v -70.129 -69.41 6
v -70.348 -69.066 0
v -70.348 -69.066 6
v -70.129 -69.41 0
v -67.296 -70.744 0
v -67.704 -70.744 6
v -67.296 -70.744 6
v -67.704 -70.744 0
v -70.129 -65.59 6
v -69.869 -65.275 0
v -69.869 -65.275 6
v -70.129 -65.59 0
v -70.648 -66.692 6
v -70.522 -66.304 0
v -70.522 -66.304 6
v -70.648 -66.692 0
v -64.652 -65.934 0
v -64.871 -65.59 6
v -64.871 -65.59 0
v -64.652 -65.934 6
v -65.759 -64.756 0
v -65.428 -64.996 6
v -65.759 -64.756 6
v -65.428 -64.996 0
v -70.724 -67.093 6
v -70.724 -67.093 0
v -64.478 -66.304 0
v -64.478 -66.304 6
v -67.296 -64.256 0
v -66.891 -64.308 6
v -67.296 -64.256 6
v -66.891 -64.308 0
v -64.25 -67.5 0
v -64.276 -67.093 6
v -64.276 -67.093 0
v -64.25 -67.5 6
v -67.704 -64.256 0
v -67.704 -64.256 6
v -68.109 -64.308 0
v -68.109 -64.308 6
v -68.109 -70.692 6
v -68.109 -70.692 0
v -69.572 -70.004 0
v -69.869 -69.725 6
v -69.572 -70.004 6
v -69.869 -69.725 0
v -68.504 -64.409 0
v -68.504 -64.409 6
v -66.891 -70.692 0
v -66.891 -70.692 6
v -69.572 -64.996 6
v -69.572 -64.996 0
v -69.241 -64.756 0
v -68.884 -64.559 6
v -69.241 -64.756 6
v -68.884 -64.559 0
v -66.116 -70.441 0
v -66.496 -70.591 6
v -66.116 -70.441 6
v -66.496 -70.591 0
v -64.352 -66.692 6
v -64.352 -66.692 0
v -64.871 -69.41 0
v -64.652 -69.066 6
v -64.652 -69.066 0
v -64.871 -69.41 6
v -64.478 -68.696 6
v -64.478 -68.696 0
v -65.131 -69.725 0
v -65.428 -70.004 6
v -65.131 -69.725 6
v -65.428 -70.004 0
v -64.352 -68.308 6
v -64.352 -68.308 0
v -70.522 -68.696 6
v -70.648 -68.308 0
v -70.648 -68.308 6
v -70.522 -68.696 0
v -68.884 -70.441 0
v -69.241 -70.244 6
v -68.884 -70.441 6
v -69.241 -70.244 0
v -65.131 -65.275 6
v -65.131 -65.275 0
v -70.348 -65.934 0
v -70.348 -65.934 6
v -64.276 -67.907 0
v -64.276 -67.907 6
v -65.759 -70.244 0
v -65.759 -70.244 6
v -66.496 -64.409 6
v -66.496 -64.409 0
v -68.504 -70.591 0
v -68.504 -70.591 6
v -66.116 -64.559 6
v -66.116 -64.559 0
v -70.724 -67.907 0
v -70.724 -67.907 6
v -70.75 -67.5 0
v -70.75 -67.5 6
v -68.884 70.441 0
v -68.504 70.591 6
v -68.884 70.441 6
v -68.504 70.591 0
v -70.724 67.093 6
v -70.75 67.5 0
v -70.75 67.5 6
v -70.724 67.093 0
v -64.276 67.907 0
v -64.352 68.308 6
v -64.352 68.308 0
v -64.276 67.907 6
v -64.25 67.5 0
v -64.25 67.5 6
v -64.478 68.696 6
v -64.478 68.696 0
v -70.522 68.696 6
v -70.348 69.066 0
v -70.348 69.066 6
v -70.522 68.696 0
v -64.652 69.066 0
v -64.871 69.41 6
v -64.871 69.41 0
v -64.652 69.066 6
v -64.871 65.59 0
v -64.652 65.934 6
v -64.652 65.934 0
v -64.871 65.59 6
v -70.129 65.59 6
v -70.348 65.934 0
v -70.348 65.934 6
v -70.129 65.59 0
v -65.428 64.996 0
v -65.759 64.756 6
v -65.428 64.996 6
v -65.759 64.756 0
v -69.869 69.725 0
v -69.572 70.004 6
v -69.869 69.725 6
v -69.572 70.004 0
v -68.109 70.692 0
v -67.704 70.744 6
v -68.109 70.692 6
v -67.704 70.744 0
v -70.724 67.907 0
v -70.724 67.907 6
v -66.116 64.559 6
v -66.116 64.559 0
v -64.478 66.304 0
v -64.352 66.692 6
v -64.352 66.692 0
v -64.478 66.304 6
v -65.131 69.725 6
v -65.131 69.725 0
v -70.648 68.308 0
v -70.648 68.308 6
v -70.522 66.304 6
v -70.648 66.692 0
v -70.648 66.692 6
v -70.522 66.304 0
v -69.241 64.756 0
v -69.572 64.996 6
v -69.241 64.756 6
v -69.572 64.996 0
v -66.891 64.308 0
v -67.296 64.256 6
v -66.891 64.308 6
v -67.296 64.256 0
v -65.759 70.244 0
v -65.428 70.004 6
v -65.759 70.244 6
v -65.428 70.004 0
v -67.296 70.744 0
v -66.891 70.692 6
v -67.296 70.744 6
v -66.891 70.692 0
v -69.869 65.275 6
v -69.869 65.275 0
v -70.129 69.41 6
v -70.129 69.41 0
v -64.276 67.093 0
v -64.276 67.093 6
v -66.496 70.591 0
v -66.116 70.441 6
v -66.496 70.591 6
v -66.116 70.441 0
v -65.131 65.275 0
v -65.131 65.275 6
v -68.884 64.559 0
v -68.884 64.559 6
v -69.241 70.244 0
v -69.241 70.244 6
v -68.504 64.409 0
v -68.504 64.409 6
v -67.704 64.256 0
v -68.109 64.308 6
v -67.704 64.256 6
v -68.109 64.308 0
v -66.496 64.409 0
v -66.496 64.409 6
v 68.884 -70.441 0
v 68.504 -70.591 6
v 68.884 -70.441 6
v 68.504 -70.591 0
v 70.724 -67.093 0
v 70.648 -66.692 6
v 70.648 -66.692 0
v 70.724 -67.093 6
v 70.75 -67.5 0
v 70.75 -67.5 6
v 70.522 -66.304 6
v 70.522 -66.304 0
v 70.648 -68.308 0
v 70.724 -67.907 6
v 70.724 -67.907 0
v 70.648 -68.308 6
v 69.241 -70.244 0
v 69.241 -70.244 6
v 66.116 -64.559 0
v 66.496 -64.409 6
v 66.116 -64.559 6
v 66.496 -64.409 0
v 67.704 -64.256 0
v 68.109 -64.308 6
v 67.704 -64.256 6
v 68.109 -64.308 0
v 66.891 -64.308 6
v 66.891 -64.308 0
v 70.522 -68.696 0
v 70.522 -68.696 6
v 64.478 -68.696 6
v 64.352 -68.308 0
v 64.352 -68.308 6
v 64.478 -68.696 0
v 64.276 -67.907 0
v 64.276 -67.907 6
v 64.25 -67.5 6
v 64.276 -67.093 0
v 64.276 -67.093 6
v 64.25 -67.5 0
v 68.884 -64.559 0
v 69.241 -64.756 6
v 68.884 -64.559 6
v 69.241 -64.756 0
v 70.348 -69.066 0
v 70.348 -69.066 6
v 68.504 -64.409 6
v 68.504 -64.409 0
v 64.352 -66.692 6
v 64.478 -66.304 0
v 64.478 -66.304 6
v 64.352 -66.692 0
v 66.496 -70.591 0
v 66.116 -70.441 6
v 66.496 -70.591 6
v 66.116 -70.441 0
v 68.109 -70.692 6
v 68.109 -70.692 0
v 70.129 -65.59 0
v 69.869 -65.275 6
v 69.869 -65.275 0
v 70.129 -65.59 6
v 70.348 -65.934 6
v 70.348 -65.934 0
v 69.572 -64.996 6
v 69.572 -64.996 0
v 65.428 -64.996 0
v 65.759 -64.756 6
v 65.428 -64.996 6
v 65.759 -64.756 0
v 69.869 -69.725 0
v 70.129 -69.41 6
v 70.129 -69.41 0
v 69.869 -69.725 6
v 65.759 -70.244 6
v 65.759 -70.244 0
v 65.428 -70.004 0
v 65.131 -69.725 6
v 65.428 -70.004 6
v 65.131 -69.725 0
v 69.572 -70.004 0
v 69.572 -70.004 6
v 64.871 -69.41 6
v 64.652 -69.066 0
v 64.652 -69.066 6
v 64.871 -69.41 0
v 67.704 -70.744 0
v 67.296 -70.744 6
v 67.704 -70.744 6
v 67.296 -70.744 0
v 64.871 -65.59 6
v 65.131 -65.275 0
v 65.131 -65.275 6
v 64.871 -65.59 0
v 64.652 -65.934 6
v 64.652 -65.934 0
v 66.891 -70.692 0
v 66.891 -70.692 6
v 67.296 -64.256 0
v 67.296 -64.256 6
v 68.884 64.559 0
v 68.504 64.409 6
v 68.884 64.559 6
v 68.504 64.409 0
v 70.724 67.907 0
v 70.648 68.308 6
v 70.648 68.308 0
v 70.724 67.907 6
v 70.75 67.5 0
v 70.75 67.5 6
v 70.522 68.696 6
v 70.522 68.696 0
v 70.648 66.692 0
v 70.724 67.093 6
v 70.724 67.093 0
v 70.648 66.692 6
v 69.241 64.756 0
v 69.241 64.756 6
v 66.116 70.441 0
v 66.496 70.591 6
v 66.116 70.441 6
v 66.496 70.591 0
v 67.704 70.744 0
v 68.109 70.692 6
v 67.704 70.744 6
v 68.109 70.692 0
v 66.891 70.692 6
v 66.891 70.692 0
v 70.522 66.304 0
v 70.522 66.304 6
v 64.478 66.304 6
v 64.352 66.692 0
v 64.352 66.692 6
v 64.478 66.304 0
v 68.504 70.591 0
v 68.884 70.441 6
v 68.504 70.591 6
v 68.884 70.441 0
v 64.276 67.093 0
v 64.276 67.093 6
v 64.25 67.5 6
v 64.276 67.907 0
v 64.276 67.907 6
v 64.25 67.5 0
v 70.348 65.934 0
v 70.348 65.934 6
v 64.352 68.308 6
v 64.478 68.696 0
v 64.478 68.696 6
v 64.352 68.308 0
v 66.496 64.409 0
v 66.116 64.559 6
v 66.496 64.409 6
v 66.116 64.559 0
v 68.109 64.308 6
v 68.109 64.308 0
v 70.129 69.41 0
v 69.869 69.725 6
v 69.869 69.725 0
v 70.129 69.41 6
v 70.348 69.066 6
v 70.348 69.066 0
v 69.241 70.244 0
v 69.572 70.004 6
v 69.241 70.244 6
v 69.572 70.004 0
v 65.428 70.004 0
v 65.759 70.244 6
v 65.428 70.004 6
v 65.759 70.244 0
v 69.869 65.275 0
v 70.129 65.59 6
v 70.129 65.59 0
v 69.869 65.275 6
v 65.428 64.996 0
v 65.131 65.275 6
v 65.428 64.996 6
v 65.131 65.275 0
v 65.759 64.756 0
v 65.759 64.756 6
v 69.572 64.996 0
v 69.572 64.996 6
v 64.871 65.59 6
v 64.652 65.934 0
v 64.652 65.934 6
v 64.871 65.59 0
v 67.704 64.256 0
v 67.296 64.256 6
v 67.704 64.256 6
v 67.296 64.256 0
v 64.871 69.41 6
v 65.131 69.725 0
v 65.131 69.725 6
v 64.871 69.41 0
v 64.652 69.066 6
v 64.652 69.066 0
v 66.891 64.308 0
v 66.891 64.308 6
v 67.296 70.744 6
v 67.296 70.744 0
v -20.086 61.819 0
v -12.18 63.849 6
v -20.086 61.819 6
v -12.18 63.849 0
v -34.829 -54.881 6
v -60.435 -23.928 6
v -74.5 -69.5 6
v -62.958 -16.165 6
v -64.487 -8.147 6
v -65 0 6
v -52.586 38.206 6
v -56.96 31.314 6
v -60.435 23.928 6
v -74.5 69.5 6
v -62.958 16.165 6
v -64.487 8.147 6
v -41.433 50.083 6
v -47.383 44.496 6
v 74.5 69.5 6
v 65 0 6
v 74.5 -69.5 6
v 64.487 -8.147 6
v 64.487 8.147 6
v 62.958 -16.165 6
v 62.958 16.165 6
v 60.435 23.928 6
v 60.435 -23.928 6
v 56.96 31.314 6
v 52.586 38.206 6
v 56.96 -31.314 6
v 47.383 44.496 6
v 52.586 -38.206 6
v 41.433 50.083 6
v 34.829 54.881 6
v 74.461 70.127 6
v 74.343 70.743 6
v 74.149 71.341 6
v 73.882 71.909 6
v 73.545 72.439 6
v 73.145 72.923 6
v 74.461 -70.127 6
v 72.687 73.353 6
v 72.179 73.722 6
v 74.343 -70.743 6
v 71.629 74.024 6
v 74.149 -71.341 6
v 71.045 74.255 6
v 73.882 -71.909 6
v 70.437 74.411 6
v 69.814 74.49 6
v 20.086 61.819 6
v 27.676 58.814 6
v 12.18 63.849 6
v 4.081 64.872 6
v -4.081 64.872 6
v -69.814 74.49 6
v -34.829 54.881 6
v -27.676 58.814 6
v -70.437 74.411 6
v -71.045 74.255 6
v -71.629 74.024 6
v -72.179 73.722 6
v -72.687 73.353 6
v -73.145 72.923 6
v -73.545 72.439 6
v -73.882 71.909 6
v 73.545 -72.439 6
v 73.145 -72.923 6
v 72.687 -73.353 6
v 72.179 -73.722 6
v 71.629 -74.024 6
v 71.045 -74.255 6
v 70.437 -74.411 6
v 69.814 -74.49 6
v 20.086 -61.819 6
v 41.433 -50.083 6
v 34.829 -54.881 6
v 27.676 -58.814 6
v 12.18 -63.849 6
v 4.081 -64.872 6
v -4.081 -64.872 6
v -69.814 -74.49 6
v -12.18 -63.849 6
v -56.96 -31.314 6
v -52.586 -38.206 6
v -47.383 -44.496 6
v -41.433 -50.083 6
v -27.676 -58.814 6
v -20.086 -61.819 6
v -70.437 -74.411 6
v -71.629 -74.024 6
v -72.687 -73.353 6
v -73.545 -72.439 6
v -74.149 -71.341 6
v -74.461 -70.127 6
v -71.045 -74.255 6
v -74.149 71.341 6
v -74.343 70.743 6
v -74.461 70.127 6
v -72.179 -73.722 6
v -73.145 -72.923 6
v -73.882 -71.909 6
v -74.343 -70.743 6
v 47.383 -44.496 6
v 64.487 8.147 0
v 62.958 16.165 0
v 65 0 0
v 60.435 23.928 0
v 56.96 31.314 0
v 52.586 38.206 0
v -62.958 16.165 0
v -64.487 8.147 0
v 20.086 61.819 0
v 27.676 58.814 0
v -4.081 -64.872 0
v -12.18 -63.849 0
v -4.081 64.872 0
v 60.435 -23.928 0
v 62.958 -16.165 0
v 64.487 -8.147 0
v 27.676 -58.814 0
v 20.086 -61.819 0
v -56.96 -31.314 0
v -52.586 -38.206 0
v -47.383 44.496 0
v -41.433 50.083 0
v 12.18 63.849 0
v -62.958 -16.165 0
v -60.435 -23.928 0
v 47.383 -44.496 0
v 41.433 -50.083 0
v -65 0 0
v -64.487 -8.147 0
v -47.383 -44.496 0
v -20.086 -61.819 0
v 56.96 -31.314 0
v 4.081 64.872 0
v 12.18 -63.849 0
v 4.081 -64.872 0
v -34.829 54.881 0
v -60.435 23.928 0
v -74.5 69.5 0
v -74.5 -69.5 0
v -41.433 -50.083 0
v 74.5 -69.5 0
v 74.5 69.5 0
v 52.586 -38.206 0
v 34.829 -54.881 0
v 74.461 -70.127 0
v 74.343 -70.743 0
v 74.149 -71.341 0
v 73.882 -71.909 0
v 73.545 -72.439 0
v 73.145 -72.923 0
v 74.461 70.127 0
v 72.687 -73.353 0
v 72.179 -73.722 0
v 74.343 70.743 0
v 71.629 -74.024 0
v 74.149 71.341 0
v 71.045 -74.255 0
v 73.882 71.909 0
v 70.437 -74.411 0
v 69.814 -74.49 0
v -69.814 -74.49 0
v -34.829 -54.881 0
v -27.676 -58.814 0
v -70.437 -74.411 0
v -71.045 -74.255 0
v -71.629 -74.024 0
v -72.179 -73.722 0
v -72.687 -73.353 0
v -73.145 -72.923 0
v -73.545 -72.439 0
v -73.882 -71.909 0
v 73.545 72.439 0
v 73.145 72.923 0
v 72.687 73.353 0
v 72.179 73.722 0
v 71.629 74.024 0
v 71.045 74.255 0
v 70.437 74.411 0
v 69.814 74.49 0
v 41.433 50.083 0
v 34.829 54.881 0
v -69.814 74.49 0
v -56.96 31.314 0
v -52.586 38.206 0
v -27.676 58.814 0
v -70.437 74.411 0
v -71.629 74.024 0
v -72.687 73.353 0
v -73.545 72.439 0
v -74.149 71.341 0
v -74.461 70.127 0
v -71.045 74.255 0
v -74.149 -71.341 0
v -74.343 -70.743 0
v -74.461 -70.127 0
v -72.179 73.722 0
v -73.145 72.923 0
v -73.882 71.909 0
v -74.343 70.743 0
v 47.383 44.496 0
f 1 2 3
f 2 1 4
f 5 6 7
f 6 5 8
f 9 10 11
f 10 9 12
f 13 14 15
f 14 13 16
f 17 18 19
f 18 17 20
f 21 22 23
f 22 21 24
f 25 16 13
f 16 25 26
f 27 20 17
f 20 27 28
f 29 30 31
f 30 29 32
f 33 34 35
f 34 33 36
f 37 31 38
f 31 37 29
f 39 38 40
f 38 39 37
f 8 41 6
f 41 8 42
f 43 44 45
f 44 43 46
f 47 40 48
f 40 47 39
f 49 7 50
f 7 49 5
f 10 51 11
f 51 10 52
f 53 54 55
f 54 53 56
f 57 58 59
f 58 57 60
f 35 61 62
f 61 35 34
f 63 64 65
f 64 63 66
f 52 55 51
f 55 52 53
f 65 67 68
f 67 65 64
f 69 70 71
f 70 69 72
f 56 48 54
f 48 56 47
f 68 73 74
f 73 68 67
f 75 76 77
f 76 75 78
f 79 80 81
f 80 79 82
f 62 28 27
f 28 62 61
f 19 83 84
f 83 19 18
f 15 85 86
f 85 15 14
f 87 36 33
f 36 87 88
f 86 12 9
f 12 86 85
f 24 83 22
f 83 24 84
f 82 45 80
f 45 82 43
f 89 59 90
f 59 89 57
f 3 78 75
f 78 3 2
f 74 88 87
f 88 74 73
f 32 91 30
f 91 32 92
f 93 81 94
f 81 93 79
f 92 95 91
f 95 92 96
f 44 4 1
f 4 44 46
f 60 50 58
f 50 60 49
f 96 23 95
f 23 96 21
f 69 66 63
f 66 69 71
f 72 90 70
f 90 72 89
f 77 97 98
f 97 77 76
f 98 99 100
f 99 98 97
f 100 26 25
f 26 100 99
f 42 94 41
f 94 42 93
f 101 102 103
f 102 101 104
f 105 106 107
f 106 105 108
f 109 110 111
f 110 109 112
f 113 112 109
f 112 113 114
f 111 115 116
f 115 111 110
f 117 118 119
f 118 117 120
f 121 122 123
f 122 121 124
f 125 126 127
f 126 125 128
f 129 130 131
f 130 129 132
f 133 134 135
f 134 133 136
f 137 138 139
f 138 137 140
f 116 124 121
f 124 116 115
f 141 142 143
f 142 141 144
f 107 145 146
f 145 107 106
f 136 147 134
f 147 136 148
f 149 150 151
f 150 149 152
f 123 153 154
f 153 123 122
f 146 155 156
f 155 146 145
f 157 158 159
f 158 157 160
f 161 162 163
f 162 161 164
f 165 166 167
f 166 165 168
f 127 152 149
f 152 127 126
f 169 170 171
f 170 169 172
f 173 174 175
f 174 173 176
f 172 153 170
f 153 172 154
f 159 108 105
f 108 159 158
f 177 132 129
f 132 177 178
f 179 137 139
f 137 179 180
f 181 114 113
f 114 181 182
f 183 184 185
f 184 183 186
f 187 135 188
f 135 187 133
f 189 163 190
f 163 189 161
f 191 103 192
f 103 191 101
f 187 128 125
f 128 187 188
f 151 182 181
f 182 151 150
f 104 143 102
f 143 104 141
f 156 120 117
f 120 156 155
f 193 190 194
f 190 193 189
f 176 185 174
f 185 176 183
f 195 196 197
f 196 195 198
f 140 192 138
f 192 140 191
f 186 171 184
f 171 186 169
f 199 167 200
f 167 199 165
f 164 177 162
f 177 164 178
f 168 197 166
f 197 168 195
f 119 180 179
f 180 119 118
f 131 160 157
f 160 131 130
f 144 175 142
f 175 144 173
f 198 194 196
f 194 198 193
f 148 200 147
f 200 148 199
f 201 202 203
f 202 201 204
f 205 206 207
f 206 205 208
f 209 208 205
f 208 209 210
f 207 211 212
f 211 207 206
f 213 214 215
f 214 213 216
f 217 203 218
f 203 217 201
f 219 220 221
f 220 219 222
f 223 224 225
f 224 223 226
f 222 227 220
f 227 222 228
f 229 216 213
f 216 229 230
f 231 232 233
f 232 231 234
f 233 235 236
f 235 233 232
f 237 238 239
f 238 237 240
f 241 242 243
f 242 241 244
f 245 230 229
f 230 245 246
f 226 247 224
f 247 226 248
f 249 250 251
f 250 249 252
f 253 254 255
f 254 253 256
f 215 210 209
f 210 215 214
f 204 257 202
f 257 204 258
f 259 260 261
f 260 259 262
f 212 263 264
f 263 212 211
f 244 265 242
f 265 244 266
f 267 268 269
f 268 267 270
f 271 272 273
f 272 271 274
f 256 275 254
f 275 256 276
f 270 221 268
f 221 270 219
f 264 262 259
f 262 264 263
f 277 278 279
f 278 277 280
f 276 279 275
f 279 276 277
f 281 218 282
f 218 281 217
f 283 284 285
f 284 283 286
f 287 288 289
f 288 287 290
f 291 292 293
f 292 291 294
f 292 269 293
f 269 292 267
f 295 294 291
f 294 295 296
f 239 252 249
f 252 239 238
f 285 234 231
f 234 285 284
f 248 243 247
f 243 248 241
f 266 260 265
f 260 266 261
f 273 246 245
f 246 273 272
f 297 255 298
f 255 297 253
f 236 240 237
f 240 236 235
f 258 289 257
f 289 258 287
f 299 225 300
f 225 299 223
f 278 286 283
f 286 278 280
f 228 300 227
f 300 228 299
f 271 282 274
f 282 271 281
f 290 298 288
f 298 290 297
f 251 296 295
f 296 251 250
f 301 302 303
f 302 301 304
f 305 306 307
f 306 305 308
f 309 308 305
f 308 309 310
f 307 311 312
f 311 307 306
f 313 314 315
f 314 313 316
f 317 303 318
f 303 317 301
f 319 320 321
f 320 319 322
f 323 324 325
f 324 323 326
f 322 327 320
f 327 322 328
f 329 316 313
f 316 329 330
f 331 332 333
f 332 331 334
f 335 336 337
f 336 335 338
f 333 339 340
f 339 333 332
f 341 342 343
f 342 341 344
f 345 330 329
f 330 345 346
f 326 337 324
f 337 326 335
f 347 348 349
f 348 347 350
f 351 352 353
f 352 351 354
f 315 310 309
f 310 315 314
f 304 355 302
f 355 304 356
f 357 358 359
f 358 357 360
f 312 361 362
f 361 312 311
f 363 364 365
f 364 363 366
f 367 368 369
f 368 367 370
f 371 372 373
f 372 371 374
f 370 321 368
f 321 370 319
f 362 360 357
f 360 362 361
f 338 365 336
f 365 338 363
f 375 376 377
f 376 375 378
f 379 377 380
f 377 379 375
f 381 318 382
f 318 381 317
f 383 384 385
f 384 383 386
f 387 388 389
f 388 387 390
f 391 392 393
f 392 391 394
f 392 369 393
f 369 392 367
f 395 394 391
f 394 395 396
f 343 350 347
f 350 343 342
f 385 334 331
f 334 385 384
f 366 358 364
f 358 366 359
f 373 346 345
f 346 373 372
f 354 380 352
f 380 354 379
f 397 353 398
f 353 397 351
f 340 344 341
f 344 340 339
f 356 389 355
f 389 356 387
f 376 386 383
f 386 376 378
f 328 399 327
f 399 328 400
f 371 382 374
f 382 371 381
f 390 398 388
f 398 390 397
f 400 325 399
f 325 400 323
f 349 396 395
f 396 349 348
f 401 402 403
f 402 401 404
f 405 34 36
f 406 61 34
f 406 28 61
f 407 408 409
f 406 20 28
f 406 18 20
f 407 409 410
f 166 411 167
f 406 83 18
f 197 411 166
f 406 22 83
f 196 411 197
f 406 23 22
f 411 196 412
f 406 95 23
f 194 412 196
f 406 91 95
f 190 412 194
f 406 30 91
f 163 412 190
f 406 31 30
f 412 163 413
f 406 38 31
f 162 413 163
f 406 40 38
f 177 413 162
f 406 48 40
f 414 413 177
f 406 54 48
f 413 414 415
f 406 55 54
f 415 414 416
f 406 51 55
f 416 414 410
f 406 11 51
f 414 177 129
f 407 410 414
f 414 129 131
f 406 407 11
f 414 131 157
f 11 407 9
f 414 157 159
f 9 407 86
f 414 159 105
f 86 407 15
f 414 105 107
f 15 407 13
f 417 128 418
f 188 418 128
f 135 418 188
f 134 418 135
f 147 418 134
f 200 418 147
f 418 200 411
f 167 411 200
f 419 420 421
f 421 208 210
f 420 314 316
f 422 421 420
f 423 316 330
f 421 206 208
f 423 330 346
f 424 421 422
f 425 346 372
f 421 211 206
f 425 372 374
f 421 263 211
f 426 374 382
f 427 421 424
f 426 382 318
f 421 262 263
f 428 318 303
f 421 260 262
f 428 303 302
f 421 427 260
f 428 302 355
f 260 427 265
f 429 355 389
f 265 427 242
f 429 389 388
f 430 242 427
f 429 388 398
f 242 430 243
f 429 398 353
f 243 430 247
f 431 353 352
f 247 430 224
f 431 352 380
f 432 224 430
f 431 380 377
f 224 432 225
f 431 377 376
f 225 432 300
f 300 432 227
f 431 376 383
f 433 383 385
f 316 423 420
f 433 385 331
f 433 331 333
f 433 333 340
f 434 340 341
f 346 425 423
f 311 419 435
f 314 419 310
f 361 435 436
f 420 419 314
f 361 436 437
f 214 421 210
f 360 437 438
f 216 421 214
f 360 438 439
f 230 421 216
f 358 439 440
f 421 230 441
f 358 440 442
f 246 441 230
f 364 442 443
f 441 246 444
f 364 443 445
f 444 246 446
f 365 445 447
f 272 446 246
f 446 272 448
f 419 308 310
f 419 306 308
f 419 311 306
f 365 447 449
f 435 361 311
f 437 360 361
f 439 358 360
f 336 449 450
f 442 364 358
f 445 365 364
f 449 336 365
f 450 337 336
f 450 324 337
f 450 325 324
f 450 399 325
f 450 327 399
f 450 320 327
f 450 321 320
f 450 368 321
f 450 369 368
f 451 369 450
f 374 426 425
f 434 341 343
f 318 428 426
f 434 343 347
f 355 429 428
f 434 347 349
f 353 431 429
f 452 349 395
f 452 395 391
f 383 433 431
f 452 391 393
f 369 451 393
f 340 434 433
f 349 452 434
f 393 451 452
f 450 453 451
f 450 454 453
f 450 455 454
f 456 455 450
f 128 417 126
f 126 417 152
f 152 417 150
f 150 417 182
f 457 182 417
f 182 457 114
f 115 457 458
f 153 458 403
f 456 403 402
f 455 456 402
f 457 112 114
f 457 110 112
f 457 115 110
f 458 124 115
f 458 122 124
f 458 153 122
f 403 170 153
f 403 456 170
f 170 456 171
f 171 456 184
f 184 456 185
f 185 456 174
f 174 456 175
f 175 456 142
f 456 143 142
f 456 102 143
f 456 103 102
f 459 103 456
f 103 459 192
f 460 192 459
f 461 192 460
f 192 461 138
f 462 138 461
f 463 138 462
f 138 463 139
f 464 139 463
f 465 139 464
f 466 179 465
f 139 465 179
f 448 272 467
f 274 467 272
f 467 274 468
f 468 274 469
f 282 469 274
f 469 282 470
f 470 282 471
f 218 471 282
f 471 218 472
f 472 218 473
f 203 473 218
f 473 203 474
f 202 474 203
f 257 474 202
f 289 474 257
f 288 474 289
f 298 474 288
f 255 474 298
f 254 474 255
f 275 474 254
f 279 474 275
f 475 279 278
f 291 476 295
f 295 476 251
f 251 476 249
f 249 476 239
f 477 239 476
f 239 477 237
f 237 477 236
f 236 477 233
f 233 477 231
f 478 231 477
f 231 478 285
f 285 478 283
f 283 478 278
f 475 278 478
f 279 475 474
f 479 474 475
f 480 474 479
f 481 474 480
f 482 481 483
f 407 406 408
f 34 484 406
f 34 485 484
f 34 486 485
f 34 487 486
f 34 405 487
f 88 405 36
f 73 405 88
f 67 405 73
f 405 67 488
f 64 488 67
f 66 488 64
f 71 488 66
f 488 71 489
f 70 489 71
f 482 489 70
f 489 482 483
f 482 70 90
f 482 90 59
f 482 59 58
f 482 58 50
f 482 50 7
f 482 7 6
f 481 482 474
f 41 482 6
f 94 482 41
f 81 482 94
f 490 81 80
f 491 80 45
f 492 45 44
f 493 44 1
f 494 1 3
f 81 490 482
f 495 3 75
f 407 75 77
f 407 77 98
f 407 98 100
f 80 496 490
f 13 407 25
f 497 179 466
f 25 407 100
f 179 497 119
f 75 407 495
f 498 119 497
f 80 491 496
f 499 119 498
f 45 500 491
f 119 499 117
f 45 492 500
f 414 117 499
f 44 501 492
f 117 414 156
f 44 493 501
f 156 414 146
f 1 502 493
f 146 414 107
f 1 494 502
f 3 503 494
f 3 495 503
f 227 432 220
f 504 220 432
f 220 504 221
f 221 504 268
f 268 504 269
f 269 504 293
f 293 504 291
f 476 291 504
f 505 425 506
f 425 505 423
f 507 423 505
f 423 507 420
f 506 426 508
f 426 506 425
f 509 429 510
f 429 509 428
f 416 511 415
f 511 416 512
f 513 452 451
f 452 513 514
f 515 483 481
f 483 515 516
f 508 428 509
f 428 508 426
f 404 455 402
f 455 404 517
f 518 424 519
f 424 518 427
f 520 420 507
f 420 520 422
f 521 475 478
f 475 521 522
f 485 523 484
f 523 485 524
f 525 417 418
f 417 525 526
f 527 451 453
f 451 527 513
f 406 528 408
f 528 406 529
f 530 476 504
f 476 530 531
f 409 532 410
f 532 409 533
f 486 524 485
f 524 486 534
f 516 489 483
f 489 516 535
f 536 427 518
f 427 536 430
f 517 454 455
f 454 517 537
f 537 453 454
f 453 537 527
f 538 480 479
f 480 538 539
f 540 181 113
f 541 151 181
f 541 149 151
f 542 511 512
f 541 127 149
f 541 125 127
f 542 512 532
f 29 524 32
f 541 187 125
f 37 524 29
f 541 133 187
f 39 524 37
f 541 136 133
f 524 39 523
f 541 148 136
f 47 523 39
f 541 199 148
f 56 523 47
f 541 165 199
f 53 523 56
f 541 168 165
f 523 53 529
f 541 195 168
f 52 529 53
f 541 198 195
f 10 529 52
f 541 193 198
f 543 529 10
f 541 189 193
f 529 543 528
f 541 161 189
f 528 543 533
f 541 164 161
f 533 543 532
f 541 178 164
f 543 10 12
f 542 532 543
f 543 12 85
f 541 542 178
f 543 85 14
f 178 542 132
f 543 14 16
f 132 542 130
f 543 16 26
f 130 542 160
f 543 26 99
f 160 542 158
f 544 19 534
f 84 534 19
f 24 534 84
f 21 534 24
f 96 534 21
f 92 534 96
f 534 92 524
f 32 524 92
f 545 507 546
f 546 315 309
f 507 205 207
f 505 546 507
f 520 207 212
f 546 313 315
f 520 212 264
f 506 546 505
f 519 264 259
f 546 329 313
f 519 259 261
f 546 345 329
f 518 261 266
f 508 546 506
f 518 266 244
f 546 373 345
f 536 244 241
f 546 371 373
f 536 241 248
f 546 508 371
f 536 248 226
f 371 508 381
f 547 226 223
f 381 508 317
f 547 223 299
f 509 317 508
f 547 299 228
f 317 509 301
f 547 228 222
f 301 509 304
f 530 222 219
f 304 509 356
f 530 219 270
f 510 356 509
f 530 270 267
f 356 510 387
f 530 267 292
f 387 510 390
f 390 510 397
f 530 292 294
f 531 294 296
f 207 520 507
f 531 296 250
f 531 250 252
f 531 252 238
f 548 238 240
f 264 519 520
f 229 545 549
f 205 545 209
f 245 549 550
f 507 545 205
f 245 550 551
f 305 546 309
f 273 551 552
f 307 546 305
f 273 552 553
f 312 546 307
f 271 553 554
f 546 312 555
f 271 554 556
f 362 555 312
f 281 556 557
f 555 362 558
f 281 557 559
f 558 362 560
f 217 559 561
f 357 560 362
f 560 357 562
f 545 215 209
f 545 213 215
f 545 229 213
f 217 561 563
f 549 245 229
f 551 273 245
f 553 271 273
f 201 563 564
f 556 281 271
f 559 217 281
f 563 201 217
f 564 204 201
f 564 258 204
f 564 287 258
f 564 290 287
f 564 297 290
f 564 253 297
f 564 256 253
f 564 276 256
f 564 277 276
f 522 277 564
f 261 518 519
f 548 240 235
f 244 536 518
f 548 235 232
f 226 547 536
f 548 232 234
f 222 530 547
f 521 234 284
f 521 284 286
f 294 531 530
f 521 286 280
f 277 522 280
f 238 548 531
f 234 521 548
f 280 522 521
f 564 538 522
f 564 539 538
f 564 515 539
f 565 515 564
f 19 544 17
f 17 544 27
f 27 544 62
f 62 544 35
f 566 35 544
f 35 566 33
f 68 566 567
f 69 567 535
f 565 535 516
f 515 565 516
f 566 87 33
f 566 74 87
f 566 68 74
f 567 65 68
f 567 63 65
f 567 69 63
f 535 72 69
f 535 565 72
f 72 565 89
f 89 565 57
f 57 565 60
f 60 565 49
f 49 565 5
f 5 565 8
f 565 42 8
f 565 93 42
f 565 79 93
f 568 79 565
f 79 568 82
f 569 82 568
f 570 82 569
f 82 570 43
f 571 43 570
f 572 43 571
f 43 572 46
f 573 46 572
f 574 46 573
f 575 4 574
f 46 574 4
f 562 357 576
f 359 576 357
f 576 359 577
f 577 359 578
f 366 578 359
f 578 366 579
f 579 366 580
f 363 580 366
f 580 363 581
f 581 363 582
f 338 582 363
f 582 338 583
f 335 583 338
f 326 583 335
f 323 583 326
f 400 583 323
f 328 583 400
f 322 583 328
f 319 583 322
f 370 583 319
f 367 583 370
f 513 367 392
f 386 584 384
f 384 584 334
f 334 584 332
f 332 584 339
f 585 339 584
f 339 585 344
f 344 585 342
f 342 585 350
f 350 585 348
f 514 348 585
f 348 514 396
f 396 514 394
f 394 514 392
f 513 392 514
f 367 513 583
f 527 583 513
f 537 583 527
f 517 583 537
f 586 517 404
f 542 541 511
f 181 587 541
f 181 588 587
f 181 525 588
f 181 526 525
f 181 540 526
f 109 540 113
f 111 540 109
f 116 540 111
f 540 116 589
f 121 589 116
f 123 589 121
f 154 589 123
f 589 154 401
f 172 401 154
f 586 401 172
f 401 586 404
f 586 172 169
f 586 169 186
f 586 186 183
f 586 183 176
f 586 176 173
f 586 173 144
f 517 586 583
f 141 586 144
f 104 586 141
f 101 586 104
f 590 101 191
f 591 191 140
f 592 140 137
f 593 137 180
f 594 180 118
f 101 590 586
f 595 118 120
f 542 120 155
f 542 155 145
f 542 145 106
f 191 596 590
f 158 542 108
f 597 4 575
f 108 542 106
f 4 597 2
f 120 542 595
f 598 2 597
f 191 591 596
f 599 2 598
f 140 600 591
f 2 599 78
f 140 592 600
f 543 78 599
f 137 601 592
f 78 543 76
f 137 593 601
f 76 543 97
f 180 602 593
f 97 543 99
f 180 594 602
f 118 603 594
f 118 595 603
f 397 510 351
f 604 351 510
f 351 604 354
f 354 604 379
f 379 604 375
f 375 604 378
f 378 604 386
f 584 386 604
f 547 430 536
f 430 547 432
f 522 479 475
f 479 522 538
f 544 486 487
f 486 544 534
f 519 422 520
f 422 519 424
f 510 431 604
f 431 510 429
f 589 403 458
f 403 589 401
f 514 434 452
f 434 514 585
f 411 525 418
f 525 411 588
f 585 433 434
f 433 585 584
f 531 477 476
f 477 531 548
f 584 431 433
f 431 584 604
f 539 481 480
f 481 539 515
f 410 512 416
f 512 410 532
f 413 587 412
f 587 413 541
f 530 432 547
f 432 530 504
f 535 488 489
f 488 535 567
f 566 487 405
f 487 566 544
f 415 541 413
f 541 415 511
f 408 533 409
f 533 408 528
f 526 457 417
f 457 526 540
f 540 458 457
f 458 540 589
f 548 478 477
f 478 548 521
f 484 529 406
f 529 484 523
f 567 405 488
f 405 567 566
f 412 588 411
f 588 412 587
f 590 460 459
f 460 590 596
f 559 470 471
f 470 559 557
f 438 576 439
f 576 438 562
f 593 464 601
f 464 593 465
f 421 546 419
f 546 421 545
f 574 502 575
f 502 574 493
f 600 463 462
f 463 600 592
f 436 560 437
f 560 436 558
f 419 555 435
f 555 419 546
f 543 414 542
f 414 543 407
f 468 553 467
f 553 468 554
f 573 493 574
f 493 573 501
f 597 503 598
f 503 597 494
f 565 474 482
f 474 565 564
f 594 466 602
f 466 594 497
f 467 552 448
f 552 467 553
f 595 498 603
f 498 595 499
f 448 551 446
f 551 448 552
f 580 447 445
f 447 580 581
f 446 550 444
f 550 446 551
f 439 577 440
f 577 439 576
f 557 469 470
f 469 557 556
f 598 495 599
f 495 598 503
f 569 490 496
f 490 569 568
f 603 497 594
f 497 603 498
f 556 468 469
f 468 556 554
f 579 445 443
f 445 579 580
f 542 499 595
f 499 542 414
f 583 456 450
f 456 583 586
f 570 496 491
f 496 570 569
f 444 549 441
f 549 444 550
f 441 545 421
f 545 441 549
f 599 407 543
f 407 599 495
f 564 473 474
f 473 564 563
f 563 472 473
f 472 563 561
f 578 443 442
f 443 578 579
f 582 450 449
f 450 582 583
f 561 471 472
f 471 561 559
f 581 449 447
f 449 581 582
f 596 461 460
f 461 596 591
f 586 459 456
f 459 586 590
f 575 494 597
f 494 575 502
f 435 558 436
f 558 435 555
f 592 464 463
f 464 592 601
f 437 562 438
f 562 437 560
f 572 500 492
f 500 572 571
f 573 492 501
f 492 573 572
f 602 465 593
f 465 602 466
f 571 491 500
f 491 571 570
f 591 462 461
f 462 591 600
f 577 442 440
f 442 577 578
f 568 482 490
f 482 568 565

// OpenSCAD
$fn = 50;


difference() {
	union() {
		hull() {
			translate(v = [-69.5000000000, 69.5000000000, 0]) {
				cylinder(h = 6, r = 5);
			}
			translate(v = [69.5000000000, 69.5000000000, 0]) {
				cylinder(h = 6, r = 5);
			}
			translate(v = [-69.5000000000, -69.5000000000, 0]) {
				cylinder(h = 6, r = 5);
			}
			translate(v = [69.5000000000, -69.5000000000, 0]) {
				cylinder(h = 6, r = 5);
			}
		}
	}
	union() {
		#translate(v = [-67.5000000000, -67.5000000000, -100.0000000000]) {
			cylinder(h = 200, r = 3.2500000000);
		}
		#translate(v = [-67.5000000000, 67.5000000000, -100.0000000000]) {
			cylinder(h = 200, r = 3.2500000000);
		}
		#translate(v = [67.5000000000, -67.5000000000, -100.0000000000]) {
			cylinder(h = 200, r = 3.2500000000);
		}
		#translate(v = [67.5000000000, 67.5000000000, -100.0000000000]) {
			cylinder(h = 200, r = 3.2500000000);
		}
		#cylinder(h = 6, r = 65.0000000000);
	}
}
